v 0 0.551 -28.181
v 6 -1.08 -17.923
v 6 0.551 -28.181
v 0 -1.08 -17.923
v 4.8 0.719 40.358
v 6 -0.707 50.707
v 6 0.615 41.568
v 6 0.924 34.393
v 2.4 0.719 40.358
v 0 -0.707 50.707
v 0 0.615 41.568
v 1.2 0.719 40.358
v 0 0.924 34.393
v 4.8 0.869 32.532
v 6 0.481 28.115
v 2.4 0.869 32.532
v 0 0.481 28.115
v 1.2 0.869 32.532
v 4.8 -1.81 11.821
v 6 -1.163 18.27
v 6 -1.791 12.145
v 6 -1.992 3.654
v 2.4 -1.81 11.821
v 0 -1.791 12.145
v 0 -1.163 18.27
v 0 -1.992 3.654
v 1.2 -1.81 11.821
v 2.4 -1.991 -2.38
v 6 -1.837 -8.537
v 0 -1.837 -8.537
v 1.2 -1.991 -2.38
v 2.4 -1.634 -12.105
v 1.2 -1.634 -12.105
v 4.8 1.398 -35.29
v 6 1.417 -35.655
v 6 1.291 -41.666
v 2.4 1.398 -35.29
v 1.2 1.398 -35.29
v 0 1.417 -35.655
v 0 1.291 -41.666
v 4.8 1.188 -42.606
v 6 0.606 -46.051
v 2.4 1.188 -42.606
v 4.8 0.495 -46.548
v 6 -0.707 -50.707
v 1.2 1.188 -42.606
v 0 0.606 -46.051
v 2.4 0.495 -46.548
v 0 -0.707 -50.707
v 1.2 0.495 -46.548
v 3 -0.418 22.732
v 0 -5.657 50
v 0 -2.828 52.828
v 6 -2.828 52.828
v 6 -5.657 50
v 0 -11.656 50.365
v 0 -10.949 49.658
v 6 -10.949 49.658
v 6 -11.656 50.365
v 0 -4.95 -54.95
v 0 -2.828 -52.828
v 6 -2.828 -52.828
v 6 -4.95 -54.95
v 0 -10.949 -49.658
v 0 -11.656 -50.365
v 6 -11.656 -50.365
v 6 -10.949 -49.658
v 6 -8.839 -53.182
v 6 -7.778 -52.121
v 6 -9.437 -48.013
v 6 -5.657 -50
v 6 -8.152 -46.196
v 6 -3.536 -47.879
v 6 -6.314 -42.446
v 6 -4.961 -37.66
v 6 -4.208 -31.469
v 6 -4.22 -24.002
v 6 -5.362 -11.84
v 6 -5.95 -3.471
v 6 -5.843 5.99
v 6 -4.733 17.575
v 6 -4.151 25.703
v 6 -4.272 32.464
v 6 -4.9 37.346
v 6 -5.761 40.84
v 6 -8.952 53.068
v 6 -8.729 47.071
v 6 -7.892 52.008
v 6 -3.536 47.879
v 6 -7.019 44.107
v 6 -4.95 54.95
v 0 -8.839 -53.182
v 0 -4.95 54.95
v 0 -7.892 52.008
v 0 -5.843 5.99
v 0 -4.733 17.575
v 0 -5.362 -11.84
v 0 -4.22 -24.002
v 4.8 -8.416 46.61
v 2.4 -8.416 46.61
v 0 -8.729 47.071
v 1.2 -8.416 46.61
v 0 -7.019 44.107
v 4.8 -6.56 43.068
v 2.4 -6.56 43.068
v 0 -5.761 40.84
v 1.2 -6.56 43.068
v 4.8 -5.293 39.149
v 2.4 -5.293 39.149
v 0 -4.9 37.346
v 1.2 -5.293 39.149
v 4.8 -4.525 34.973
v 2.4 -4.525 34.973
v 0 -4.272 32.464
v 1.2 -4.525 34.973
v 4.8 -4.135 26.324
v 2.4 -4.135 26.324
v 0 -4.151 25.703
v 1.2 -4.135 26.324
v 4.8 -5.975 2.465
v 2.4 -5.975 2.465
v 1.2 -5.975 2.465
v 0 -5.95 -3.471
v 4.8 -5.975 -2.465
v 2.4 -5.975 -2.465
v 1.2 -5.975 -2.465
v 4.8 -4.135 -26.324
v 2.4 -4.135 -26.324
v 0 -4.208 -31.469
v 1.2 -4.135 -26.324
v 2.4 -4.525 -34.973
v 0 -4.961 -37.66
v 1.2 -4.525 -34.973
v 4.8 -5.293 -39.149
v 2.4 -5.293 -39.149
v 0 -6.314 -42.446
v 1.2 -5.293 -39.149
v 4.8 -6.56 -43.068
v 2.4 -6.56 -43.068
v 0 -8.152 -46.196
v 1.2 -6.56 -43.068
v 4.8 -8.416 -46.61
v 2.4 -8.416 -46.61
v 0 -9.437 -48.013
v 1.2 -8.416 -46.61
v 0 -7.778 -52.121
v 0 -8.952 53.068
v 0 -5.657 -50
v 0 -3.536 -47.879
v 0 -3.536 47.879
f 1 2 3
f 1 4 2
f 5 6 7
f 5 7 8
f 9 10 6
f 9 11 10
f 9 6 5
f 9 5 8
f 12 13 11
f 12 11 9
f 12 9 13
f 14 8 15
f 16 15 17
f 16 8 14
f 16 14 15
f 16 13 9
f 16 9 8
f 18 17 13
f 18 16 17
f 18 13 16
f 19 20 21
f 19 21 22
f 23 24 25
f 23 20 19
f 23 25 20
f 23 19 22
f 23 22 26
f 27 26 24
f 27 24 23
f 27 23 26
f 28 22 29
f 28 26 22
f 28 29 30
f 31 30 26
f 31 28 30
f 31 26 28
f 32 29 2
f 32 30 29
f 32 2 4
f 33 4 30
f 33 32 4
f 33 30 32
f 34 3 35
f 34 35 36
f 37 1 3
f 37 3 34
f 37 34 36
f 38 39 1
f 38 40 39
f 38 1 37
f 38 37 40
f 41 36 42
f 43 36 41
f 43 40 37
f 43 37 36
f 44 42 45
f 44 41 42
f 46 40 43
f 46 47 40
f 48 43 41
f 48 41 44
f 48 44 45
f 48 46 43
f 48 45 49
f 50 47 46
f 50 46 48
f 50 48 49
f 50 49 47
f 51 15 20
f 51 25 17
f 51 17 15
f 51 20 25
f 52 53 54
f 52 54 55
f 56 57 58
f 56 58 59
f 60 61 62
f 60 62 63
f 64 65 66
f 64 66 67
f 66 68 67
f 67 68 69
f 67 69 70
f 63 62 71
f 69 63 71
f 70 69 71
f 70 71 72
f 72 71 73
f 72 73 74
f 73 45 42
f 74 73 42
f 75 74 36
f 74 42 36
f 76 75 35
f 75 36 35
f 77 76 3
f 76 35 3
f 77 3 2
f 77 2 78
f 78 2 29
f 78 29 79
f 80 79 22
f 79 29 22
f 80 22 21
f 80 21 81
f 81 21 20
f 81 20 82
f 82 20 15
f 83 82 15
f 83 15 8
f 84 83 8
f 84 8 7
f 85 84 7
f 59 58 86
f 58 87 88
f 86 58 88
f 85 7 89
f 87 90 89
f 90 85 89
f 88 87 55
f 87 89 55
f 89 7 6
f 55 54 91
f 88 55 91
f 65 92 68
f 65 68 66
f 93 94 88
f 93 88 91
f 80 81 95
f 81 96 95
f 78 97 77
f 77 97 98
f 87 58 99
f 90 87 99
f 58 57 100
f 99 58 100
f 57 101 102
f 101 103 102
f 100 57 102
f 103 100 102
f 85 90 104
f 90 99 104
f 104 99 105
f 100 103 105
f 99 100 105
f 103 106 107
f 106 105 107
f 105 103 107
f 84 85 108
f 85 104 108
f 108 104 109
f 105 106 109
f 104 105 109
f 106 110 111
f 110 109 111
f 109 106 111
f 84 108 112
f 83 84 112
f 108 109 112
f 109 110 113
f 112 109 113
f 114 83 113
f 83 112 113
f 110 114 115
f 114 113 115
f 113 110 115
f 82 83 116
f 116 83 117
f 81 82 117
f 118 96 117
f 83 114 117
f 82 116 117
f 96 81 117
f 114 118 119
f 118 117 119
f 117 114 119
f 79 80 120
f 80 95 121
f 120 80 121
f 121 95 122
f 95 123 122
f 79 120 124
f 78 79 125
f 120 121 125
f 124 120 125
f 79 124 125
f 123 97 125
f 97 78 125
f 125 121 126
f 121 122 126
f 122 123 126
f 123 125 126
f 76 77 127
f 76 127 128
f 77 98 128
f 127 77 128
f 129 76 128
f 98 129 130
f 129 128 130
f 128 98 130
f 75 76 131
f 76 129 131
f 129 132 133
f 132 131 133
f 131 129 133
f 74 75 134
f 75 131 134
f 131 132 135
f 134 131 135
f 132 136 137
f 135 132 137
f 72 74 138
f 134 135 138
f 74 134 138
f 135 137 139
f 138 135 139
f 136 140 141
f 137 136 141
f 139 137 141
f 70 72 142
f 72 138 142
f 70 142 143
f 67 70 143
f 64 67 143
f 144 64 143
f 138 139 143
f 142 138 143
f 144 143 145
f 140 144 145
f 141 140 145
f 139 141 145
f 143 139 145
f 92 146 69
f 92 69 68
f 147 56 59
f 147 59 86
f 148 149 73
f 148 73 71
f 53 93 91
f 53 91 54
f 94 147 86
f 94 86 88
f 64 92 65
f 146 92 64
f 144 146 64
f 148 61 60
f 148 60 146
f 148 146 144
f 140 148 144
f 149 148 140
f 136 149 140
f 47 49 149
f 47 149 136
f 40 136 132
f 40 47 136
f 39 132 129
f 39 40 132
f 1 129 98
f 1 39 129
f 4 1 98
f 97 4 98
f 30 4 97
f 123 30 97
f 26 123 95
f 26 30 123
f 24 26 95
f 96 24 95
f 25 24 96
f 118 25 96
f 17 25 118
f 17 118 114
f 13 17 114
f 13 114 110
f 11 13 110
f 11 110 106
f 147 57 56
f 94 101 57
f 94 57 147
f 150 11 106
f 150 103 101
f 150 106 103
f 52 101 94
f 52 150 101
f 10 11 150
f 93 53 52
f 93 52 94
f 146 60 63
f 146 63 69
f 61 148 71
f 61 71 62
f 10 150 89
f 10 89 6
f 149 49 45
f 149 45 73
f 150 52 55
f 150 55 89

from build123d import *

# Parameters (mm, degrees)
ESTRUSIONE_ESTRUSIONE1_DEPTH = 6


with BuildPart() as part:
    # Schizzo1 → Estrusione-Estrusione1 (new body)
    with BuildSketch(Plane(origin=(0, 0, 0), x_dir=(0, 0, -1), z_dir=(1, 0, 0))):
        with BuildLine():
            Line((-54.949747468, -4.949747468), (-52.828427125, -2.828427125))
            Line((-52.828427125, -2.828427125), (-50, -5.656854249))
            Line((-50, -5.656854249), (-47.878679656, -3.535533906))
            Line((-47.878679656, -3.535533906), (-50.707106781, -0.707106781))
            add(Edge.make_bspline(
                [(-50.707106781, -0.707106781), (-34.940891697, 2.276271887), (-17.588095178, -2.006317394), (-8.15045286, -1.973714009), (7.039741041, -2.027945044), (22.77573383, -1.214378117), (39.305531053, 3.253874033), (50.707106781, -0.707106781)],
                knots=[0, 0, 0, 0, 0.188415067, 0.445999155, 0.506836248, 0.735948909, 1, 1, 1, 1], degree=3))
            Line((50.707106781, -0.707106781), (47.878679656, -3.535533906))
            Line((47.878679656, -3.535533906), (50, -5.656854249))
            Line((50, -5.656854249), (52.828427125, -2.828427125))
            Line((52.828427125, -2.828427125), (54.949747468, -4.949747468))
            Line((54.949747468, -4.949747468), (52.121320344, -7.778174593))
            Line((52.121320344, -7.778174593), (53.181980515, -8.838834765))
            Line((53.181980515, -8.838834765), (50.364612745, -11.656202535))
            Line((50.364612745, -11.656202535), (49.657505964, -10.949095754))
            add(Edge.make_bspline(
                [(-49.657505964, -10.949095754), (-42.297875545, -3.213884189), (-21.591673469, -3.850484781), (-7.81090535, -6.008179807), (7.81090535, -6.008179807), (21.591673469, -3.850484781), (42.297875545, -3.213884189), (49.657505964, -10.949095754)],
                knots=[0, 0, 0, 0, 0.322683239, 0.480298138, 0.519701862, 0.677316761, 1, 1, 1, 1], degree=3))
            Line((-49.657505964, -10.949095754), (-50.364612745, -11.656202535))
            Line((-50.364612745, -11.656202535), (-53.06846134, -8.95235394))
            Line((-53.06846134, -8.95235394), (-52.007801168, -7.891693768))
            Line((-52.007801168, -7.891693768), (-54.949747468, -4.949747468))
        make_face()
    extrude(amount=ESTRUSIONE_ESTRUSIONE1_DEPTH)


solid = part.part
